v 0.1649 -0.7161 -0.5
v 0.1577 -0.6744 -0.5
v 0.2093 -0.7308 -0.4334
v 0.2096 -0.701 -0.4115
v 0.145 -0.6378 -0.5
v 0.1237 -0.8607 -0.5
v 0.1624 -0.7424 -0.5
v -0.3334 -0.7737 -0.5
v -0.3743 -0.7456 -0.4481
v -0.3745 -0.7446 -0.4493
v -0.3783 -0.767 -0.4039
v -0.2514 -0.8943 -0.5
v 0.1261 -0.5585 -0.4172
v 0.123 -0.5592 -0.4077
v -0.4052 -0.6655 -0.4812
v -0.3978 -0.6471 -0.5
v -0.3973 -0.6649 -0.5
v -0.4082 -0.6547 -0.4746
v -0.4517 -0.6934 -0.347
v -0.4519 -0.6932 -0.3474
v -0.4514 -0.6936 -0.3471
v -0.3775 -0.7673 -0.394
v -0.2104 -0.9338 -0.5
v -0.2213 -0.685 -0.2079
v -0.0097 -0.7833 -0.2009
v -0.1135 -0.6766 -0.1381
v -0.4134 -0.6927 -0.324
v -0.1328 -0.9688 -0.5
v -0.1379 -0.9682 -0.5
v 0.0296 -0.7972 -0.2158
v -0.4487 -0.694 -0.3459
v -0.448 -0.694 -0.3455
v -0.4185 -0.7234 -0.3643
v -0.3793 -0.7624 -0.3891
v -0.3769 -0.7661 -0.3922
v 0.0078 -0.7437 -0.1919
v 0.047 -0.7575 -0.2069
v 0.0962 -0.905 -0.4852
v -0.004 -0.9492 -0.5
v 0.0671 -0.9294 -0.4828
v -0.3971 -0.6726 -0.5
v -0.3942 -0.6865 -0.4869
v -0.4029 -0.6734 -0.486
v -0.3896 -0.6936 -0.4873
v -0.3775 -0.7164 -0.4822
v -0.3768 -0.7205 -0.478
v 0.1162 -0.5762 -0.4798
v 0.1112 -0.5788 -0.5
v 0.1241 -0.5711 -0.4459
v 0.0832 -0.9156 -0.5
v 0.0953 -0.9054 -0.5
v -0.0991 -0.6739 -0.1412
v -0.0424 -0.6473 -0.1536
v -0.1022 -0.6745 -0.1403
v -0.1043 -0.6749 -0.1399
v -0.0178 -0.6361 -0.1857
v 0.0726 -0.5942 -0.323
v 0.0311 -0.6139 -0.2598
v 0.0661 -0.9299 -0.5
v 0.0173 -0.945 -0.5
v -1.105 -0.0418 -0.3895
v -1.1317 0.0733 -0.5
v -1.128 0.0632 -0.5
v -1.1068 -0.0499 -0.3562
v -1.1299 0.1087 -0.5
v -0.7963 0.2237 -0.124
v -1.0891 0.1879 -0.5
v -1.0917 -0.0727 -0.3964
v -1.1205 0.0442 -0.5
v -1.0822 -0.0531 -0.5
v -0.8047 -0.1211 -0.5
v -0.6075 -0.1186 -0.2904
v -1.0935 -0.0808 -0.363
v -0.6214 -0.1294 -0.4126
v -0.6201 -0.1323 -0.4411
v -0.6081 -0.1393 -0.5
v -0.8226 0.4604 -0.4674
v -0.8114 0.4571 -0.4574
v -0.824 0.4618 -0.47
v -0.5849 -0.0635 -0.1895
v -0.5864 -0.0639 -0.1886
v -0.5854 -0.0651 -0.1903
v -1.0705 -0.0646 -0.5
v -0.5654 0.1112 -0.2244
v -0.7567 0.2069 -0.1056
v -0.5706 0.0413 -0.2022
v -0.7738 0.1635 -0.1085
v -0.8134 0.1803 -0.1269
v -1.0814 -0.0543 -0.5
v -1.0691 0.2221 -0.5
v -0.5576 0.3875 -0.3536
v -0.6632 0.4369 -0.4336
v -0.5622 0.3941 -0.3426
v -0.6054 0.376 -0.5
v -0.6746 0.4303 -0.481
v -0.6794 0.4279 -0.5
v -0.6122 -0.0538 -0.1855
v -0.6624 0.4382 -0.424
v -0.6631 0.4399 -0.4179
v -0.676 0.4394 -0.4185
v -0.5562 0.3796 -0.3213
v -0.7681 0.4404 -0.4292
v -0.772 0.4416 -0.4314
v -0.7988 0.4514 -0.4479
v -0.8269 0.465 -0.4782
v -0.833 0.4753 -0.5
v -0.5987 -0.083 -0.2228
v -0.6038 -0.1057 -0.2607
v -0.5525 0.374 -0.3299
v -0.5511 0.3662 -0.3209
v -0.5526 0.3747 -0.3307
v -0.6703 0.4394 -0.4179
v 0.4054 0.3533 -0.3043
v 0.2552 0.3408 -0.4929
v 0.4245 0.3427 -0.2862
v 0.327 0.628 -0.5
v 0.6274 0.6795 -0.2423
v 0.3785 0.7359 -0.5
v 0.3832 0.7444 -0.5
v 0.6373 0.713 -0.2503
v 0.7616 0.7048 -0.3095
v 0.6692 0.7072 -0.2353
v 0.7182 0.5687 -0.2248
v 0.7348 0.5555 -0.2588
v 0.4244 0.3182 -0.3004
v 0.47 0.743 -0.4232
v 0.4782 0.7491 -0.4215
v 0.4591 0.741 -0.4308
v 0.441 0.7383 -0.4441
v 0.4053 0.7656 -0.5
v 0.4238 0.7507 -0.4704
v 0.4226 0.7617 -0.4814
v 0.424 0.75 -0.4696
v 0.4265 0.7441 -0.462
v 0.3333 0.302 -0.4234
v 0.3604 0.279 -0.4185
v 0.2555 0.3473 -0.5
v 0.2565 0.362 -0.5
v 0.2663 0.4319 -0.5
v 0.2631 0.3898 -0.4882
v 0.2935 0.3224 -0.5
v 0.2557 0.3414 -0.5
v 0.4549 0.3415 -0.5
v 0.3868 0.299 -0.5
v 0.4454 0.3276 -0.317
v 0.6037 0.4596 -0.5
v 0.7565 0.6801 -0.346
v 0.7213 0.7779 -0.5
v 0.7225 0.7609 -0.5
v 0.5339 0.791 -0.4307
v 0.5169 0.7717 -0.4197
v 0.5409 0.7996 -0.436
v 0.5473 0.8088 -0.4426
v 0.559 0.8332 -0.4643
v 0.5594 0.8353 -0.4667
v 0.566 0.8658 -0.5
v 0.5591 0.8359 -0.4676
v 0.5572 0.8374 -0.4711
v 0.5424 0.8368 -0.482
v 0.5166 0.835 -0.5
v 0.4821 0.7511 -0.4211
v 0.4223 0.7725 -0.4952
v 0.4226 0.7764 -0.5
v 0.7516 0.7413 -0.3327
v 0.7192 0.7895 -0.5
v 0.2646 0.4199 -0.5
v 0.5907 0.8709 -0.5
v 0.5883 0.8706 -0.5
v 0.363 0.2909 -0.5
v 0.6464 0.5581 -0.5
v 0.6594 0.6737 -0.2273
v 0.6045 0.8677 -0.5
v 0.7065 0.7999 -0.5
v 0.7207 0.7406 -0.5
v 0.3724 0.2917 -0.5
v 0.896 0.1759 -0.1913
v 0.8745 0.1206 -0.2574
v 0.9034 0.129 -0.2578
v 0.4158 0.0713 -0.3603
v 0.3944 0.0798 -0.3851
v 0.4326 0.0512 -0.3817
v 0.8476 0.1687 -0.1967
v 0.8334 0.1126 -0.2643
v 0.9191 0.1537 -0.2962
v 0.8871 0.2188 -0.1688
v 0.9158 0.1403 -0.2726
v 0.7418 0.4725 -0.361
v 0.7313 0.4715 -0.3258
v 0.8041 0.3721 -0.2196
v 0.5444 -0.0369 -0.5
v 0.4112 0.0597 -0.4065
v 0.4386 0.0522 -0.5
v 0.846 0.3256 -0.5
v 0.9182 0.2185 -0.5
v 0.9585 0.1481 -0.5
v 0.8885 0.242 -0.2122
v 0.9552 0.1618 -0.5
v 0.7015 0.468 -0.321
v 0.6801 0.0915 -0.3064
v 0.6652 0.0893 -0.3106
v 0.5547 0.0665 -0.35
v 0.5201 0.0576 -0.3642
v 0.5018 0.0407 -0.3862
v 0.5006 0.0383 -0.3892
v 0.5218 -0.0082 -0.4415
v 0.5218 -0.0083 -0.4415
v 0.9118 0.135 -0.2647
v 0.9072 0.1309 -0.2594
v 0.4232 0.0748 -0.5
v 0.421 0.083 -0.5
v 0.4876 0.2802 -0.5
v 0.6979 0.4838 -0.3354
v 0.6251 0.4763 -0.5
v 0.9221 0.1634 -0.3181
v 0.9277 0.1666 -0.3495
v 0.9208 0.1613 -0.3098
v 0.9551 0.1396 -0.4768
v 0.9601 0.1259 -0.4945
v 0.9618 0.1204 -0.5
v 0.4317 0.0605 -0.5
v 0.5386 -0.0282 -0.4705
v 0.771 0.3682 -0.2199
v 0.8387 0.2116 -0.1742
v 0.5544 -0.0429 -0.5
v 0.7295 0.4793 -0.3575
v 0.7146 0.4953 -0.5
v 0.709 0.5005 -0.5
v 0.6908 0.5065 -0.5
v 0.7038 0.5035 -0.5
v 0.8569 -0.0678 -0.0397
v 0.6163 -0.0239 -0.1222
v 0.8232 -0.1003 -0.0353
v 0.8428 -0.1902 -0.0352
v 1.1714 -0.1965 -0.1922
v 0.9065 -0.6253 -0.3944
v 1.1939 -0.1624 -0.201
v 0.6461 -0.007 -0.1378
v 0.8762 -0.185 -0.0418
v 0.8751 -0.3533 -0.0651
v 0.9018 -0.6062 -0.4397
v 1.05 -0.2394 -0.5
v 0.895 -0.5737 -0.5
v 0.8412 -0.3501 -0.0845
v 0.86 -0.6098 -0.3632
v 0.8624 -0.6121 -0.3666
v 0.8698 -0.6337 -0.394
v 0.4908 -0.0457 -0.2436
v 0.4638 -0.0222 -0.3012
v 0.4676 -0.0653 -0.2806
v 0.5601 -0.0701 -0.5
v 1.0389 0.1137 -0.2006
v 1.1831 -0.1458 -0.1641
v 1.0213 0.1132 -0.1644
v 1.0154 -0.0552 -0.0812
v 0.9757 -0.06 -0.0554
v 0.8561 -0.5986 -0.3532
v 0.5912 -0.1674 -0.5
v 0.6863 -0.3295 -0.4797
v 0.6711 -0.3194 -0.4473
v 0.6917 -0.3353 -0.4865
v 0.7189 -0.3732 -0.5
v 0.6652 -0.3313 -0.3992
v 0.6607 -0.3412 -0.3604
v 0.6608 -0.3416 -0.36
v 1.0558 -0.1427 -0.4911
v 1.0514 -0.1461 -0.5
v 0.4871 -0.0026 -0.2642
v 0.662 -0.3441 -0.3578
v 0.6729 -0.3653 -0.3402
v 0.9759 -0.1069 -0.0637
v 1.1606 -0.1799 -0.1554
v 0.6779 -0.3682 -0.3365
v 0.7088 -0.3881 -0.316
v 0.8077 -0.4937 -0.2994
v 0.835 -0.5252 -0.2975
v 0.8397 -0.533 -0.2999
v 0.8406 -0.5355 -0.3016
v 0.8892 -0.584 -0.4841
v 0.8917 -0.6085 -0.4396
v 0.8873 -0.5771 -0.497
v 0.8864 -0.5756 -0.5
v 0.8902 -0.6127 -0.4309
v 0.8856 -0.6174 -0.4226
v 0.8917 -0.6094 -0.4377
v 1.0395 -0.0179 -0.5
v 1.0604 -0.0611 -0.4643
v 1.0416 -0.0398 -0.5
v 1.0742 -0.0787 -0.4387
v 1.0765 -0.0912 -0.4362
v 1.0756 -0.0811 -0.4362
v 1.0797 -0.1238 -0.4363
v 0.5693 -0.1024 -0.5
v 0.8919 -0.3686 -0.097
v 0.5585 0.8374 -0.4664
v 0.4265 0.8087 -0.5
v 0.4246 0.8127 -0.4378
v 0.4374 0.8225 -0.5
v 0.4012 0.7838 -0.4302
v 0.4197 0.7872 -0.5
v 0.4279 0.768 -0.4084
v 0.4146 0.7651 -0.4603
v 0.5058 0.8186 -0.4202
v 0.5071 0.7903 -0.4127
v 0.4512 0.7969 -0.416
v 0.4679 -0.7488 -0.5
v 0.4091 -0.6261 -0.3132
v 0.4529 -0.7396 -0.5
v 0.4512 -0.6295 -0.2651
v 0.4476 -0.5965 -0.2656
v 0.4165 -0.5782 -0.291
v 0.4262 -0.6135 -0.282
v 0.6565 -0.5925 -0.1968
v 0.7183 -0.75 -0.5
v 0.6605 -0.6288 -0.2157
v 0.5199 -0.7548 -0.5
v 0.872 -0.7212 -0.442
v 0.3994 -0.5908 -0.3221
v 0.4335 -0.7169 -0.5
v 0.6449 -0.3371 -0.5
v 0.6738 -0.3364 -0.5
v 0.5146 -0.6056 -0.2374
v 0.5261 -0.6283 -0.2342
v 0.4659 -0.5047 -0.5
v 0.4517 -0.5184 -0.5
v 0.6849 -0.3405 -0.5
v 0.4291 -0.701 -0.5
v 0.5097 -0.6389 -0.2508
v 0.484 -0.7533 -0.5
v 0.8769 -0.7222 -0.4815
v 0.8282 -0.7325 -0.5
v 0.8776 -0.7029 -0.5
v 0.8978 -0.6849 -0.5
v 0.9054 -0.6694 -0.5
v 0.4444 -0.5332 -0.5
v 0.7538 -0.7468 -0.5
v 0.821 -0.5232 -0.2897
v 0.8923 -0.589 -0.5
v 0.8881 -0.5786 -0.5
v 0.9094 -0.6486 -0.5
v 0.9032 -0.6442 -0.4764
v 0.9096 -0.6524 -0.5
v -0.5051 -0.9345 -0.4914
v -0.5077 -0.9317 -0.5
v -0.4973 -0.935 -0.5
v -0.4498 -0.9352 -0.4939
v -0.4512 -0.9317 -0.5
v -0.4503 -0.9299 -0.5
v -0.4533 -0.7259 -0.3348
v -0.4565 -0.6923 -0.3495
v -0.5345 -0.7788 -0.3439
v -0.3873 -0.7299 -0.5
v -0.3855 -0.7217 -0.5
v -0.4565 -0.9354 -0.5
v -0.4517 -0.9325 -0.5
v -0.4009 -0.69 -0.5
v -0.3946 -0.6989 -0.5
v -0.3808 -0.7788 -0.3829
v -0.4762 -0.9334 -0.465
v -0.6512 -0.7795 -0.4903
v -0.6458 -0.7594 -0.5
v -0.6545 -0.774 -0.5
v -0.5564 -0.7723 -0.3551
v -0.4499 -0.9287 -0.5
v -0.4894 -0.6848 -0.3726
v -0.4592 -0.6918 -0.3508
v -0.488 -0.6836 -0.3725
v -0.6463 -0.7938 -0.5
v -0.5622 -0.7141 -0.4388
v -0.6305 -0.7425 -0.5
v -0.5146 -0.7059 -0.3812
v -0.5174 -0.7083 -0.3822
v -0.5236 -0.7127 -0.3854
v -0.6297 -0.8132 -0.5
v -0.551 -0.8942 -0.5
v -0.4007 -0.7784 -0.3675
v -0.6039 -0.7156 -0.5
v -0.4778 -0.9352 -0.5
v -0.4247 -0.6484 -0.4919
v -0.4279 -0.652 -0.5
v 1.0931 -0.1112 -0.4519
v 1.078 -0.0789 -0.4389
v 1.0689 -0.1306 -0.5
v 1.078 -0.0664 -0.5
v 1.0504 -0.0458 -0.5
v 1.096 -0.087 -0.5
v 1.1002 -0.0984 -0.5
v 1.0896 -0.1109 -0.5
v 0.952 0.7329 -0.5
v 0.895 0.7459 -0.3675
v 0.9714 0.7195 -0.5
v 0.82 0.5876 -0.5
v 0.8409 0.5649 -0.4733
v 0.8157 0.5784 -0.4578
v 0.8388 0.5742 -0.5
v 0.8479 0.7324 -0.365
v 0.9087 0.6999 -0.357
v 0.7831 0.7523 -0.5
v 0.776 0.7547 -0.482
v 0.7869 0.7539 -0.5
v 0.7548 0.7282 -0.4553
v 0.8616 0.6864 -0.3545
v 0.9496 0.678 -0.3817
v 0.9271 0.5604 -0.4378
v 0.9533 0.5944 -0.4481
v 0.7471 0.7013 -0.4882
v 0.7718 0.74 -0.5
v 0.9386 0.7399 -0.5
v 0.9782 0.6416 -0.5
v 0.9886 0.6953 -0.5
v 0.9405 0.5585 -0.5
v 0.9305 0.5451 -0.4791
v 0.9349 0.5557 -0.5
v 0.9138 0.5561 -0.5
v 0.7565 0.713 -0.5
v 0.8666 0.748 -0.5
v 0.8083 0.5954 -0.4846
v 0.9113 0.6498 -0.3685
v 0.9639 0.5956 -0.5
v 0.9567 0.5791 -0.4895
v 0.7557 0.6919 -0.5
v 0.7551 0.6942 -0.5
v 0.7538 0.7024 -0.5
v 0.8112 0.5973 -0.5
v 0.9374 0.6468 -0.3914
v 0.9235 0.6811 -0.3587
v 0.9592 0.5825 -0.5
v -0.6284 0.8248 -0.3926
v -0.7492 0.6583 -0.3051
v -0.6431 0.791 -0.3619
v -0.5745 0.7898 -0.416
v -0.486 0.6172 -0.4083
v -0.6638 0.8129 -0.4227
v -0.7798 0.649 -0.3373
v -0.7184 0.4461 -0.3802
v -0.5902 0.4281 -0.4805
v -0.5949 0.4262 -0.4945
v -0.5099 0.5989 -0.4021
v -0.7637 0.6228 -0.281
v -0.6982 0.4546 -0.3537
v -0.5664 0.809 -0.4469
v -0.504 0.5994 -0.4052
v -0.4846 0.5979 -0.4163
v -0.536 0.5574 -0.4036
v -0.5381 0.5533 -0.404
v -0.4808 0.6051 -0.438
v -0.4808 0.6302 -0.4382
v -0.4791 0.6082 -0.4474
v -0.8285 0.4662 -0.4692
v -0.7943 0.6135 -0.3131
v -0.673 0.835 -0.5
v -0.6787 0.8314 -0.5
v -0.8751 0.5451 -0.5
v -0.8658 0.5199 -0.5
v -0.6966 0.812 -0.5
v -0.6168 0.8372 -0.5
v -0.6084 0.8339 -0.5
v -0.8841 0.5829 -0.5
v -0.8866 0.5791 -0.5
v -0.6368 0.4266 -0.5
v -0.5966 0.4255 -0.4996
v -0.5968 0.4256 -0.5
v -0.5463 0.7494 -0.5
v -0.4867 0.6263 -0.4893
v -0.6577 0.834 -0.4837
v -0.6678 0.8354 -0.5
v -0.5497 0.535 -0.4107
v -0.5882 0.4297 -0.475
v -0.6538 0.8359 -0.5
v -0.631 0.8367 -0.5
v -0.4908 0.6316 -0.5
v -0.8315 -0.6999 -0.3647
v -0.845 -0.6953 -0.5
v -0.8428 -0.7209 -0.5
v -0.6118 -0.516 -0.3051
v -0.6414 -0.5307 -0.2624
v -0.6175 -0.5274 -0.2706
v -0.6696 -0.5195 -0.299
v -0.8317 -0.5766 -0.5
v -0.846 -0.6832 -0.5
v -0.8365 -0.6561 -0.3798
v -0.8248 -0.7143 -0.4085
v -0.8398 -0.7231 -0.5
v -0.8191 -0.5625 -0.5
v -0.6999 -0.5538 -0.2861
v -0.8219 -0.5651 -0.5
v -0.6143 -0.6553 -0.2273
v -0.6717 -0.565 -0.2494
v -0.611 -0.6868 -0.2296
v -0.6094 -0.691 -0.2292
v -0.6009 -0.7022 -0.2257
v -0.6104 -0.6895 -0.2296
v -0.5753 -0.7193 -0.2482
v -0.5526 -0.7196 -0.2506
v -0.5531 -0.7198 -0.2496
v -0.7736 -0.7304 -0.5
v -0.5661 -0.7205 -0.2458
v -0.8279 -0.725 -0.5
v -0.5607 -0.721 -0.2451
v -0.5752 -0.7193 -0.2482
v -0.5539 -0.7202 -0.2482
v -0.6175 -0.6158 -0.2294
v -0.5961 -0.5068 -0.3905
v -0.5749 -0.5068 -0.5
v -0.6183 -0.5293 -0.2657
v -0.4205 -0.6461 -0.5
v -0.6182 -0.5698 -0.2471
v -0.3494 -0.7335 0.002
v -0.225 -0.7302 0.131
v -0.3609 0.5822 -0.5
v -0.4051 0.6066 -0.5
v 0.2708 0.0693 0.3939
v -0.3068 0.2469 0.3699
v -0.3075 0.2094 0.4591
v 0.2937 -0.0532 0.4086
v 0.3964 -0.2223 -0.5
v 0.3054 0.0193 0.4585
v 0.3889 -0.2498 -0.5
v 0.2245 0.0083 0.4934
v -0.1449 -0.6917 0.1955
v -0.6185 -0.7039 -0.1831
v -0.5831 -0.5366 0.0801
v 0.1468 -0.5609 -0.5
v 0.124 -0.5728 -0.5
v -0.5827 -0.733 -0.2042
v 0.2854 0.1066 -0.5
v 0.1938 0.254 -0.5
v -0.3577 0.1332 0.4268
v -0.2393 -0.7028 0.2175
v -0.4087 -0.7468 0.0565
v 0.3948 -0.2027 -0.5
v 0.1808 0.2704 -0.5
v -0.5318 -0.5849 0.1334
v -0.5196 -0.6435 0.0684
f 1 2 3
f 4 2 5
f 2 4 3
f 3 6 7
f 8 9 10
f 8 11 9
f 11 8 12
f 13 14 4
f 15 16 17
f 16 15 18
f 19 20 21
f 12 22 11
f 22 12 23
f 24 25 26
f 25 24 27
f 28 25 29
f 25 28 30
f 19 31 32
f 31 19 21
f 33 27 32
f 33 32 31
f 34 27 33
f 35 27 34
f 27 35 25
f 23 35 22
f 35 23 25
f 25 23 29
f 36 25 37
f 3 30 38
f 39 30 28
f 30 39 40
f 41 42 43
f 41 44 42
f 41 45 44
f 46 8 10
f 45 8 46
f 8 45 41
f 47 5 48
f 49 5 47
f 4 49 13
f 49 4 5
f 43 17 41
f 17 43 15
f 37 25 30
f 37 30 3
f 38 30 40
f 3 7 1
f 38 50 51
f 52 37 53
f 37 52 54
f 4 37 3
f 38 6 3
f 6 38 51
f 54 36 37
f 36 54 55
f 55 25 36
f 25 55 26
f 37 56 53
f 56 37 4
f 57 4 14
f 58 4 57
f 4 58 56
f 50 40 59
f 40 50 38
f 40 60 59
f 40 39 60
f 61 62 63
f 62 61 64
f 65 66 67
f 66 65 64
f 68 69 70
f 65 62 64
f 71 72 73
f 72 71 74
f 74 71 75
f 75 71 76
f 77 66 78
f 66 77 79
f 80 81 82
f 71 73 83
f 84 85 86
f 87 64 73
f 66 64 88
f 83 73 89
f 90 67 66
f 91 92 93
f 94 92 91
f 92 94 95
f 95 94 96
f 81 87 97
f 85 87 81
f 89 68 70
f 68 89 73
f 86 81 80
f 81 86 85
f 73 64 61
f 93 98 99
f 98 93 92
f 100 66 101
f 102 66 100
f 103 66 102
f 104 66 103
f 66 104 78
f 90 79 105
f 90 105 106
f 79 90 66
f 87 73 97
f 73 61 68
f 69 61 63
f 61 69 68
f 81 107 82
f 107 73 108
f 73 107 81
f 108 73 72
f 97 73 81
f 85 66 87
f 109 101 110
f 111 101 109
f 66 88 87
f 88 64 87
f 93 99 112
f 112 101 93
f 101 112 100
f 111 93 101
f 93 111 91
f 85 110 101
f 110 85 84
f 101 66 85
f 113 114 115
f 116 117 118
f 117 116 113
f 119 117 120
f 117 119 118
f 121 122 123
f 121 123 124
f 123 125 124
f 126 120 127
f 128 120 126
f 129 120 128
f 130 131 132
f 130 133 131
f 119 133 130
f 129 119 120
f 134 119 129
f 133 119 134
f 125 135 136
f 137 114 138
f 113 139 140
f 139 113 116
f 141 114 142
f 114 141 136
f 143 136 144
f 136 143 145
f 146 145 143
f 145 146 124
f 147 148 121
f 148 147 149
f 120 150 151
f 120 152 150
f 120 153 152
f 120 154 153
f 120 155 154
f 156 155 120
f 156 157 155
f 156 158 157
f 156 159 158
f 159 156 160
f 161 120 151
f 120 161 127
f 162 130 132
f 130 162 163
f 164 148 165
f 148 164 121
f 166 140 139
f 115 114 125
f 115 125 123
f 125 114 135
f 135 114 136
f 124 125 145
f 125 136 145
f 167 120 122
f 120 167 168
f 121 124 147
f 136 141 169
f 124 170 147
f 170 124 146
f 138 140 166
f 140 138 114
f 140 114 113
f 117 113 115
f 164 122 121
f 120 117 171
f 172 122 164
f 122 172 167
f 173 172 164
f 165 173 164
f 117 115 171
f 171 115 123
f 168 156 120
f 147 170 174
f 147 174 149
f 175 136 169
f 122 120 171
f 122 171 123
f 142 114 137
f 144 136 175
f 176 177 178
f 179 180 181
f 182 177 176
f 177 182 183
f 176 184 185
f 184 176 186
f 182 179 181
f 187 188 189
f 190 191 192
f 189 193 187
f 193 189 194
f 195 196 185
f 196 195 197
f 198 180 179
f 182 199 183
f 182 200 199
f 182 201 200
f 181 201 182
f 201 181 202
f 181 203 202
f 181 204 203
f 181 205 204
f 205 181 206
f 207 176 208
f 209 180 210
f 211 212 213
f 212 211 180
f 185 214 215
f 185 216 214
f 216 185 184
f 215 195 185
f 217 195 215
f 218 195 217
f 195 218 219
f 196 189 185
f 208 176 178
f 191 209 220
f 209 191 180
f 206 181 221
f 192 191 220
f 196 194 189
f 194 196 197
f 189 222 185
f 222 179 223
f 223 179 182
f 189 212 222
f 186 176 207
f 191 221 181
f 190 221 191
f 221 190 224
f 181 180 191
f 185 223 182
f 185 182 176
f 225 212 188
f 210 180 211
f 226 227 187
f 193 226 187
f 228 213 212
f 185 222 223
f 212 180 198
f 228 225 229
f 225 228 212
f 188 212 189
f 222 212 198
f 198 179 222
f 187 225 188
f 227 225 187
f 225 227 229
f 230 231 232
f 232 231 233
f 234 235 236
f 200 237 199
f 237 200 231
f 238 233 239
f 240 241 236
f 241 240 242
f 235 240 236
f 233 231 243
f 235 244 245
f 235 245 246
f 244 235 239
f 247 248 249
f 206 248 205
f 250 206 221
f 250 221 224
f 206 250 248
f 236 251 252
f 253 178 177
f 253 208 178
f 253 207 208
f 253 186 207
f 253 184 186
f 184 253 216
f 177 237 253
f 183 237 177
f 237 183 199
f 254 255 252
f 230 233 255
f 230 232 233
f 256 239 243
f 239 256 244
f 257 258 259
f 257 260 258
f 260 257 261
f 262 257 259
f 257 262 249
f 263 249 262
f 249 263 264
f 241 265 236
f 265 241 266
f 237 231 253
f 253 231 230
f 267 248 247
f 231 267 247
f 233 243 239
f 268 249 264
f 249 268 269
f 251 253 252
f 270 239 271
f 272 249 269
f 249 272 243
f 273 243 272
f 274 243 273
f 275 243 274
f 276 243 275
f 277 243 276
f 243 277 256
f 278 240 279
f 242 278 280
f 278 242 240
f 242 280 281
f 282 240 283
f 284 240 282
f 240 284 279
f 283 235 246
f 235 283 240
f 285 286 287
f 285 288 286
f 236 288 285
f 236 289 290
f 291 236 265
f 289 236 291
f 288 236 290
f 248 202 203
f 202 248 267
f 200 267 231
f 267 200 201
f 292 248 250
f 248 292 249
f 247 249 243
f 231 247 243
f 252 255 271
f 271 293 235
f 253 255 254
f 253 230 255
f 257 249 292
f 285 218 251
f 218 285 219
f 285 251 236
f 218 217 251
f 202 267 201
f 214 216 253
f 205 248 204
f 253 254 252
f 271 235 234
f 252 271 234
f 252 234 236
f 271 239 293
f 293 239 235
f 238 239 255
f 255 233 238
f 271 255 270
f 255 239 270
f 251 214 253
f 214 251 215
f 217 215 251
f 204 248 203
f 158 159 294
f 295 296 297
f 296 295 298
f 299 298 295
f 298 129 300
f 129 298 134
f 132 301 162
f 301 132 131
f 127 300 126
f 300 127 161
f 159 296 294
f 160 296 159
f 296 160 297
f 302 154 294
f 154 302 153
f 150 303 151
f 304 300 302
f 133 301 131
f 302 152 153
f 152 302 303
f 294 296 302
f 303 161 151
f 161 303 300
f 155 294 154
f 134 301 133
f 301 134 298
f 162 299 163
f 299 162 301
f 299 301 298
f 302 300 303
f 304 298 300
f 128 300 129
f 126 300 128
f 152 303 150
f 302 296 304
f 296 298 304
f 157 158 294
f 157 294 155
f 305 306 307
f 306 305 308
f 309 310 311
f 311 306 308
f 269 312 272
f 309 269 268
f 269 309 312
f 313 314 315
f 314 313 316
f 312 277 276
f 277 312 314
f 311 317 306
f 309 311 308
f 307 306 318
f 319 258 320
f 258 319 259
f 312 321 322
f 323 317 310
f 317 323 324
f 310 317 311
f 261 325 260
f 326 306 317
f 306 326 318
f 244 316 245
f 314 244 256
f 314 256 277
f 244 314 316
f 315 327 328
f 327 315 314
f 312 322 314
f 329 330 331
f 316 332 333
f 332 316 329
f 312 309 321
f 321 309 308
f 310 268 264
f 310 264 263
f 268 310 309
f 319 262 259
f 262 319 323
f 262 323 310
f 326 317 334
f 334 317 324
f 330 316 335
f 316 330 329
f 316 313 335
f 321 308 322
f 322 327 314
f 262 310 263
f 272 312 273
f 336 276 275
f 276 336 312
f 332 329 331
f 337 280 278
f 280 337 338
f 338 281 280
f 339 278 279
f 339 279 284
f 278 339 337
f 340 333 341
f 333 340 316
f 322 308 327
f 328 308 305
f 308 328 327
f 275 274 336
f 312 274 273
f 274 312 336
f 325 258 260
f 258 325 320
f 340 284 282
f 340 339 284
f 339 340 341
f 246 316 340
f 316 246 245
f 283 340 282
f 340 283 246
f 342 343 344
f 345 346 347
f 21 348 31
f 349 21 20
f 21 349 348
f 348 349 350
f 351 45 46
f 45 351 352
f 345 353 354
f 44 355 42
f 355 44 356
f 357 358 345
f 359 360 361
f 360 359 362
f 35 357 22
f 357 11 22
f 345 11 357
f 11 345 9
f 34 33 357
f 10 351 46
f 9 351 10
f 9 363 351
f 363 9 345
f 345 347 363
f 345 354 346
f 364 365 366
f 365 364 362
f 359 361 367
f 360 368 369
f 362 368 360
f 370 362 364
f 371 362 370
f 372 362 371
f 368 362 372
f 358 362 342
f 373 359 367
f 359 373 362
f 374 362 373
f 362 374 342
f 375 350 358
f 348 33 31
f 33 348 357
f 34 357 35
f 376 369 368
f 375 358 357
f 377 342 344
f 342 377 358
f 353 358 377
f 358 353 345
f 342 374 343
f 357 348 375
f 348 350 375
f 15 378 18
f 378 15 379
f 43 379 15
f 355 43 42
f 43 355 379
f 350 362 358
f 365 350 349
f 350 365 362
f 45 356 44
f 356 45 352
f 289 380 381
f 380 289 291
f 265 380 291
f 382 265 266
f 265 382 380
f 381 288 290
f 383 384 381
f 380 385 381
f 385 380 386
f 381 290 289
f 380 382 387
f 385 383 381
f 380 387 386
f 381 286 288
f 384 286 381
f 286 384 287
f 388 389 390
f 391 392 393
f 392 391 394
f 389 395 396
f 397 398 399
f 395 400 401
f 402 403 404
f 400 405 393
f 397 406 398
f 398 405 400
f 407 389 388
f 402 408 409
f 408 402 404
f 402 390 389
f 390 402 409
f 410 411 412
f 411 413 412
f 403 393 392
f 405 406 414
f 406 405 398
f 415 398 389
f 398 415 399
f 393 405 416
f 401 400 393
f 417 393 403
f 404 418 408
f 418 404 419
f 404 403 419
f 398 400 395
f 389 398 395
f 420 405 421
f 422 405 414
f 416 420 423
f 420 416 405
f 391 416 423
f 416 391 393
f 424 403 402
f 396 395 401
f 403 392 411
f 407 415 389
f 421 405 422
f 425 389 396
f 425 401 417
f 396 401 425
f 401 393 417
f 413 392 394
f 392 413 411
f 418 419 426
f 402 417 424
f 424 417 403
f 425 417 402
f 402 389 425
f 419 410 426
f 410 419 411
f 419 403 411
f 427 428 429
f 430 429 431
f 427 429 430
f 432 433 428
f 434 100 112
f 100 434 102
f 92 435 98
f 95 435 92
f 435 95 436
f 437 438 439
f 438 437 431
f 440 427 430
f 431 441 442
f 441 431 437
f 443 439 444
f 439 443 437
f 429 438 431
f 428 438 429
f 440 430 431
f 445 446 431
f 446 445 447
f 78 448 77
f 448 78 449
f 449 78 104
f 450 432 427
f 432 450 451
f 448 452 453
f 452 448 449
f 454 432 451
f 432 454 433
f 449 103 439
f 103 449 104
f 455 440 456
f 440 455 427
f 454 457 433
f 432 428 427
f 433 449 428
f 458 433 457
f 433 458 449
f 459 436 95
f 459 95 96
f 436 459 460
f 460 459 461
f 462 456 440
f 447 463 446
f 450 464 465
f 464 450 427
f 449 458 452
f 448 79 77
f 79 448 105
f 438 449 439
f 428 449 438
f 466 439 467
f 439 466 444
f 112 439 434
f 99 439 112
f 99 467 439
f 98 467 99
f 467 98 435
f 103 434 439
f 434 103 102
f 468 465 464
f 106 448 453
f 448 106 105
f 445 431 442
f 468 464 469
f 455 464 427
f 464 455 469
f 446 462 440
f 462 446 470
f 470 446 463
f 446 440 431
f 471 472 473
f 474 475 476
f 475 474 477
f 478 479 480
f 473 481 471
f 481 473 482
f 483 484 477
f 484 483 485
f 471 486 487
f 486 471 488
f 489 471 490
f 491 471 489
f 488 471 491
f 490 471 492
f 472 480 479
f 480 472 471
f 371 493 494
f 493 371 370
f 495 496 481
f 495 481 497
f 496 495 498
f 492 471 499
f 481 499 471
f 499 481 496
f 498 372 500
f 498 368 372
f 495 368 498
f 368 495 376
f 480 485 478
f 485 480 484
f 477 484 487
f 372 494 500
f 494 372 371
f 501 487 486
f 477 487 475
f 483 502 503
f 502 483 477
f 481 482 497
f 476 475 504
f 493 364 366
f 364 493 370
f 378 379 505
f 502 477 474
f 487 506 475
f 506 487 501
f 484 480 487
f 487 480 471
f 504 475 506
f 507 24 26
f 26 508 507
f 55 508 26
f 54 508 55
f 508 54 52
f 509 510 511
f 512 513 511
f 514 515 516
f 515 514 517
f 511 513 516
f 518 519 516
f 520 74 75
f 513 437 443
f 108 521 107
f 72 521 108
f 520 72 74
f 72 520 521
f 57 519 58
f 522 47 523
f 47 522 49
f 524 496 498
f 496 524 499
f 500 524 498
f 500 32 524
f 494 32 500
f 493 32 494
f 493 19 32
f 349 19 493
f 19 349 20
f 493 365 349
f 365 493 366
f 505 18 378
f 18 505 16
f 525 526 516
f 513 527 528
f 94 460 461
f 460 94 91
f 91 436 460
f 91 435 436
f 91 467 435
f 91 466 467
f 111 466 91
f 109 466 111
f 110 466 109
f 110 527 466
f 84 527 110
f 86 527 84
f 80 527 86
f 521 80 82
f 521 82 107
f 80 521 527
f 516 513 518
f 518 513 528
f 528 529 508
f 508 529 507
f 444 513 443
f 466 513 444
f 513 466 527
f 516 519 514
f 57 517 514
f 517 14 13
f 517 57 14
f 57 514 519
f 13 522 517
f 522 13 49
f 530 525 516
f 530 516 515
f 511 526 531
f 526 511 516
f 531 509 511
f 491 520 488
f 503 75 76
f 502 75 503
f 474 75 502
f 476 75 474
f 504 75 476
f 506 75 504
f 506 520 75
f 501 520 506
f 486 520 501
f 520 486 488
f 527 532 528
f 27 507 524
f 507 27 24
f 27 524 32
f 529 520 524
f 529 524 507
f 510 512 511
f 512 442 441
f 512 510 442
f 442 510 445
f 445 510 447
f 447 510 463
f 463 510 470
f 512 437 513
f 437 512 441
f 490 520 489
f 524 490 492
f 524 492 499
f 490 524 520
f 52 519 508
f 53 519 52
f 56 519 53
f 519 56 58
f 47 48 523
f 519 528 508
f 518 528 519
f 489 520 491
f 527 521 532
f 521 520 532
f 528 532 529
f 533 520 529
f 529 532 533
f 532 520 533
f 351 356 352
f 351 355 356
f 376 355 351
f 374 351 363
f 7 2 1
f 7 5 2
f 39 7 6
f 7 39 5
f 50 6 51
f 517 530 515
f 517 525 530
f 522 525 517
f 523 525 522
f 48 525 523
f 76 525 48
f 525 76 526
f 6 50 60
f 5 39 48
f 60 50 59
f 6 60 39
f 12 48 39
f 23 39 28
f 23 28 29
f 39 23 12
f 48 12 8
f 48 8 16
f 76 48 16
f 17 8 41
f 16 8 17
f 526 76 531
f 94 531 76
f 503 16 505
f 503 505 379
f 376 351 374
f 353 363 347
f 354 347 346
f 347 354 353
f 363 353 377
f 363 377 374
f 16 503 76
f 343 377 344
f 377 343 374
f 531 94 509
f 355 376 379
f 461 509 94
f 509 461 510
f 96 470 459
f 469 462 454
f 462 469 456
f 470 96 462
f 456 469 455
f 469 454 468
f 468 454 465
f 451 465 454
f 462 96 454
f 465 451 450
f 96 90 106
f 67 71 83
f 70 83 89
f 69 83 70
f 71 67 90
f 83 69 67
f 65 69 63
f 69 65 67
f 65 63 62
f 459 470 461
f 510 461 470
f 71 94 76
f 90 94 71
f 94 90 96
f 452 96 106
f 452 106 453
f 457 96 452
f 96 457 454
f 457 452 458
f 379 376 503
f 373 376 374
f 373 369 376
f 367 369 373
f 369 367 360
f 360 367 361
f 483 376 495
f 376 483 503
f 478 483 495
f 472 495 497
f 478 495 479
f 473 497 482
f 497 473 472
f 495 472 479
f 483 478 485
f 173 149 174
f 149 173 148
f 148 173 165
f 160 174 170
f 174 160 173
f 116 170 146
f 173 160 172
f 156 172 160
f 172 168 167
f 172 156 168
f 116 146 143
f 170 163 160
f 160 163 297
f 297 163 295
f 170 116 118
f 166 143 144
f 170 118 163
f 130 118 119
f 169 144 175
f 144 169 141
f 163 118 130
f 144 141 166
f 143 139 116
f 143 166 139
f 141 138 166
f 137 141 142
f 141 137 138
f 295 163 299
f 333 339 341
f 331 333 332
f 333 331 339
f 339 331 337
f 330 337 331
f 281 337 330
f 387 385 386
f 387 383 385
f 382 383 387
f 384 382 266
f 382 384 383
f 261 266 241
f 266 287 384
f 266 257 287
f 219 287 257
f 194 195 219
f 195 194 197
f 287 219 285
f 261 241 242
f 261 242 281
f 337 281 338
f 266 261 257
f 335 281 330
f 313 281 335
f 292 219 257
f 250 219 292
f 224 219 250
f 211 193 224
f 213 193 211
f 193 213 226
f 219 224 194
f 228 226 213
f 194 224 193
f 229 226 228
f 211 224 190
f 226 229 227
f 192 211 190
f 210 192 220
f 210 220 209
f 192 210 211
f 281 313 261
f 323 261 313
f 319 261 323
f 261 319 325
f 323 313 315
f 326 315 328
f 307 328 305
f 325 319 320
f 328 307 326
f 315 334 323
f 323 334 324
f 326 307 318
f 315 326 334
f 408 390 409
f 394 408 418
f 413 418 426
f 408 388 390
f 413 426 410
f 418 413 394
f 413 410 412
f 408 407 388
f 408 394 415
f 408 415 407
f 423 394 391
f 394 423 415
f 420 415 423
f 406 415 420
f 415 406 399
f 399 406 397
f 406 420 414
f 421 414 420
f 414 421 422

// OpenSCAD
// file: lib.scad
function x(v) = v[0];
function y(v) = v[1];
function z(v) = v[2];
function add(v1,v2) = [ for (i = [ 0 : len(v1)-1 ]) v1[i] + v2[i] ];
function xv(d) = [d,0,0];
function yv(d) = [0,d,0];
function zv(d) = [0,0,d];

module box(v) { cube(size=v, center=true); }
module cyl(r1,r2,h) { cylinder(r1=r1, r2=r2, h=h, center=true); }

function grow(n,v) = [x(v)+n*2, y(v)+n*2, z(v)+n*2];

module rbox(v, radius=1) {
	cx = x(v)/2-radius;
	cy = y(v)/2-radius;
	cz = z(v)/2-radius;

	hull() {
		translate([cx,cy,cz]) sphere(r=radius);
		translate([cx,cy,-cz]) sphere(r=radius);
		translate([cx,-cy,cz]) sphere(r=radius);
		translate([cx,-cy,-cz]) sphere(r=radius);
		translate([-cx,cy,cz]) sphere(r=radius);
		translate([-cx,cy,-cz]) sphere(r=radius);
		translate([-cx,-cy,cz]) sphere(r=radius);
		translate([-cx,-cy,-cz]) sphere(r=radius);
	}
}

module fillet(r=1) {
  minkowski() {
    difference() {
      children();
      minkowski() {
        difference() {
          minkowski() {
            children();
            sphere(r=r);
          }
          children();
        }
        sphere(r=r);
      }
    }
    sphere(r=r);
  }
}
// main file
use <lib.scad>;

// Module randomRock : draws a random rock
module randomRock(radius,corner_size,number_of_corners){
  // Draw rock
  hull(){
    // Make a hull..
    for(i=[0:number_of_corners]){
      // random position in 'sphere'
      y = rands(0,360,1)[0];
      z = rands(0,360,1)[0];
      rotate([0,y,z])

      // translate radius (minus half of corner size)
      translate([radius-corner_size*0.5,0,0])

      // draw cube as corner
      rotate([rands(0,360,1)[0],rands(0,360,1)[0],rands(0,360,1)[0]]) // random rotation
      cube(rands(corner_size*0.5,corner_size,1)[0],center = true);
    }
  }
}

// : More corners --> More 'spheric' central stone
number_of_corners = rands(15,25,1)[0]; // [5:30]

// : Deforms central stone in vertical
stone_scale = 1; // [0.2:0.1:3]

// Number of medium size stones
medium_stones = rands(3,8,1)[0]; // [5:30]

// Number of small stones
small_stones = rands(3,8,1)[0]; // [5:30]

/* [Hidden] */
radius = 20;
corner_size = 2;

// Example
scale([0.05,0.05,0.05])
	translate([0,0,-10]) intersection(){
	  union(){

	    // big central stone
	    scale([1,1,stone_scale])

	    randomRock(radius,corner_size,number_of_corners);

	    // medium size stones
	    if(medium_stones>0){
	      for(i=[1:medium_stones]){
	        // random position in 'circle'
	        z = rands(0,360,1)[0];
	        rotate([0,0,z])

	        // translate radius
	        translate([rands(radius*0.6,radius*0.9,1)[0],0,0])
	        randomRock(rands(radius*0.3,radius*0.5,1)[0],corner_size*0.5,15);
	      }
	    }

	    // small stones
	    if(small_stones>0){
	      for(i=[0:small_stones]){
	        // random position in 'circle'
	        z = rands(0,360,1)[0];
	        rotate([0,0,z])

	        // translate radius
	        translate([rands(radius*0.7,radius*1.15,1)[0],0,0])
	        randomRock(rands(radius*0.1,radius*0.3,1)[0],corner_size*0.5,10);
	      }
	    }

	  }
	  // cut half of figure
	  translate([-50,-50,0]) cube(100);
	}
